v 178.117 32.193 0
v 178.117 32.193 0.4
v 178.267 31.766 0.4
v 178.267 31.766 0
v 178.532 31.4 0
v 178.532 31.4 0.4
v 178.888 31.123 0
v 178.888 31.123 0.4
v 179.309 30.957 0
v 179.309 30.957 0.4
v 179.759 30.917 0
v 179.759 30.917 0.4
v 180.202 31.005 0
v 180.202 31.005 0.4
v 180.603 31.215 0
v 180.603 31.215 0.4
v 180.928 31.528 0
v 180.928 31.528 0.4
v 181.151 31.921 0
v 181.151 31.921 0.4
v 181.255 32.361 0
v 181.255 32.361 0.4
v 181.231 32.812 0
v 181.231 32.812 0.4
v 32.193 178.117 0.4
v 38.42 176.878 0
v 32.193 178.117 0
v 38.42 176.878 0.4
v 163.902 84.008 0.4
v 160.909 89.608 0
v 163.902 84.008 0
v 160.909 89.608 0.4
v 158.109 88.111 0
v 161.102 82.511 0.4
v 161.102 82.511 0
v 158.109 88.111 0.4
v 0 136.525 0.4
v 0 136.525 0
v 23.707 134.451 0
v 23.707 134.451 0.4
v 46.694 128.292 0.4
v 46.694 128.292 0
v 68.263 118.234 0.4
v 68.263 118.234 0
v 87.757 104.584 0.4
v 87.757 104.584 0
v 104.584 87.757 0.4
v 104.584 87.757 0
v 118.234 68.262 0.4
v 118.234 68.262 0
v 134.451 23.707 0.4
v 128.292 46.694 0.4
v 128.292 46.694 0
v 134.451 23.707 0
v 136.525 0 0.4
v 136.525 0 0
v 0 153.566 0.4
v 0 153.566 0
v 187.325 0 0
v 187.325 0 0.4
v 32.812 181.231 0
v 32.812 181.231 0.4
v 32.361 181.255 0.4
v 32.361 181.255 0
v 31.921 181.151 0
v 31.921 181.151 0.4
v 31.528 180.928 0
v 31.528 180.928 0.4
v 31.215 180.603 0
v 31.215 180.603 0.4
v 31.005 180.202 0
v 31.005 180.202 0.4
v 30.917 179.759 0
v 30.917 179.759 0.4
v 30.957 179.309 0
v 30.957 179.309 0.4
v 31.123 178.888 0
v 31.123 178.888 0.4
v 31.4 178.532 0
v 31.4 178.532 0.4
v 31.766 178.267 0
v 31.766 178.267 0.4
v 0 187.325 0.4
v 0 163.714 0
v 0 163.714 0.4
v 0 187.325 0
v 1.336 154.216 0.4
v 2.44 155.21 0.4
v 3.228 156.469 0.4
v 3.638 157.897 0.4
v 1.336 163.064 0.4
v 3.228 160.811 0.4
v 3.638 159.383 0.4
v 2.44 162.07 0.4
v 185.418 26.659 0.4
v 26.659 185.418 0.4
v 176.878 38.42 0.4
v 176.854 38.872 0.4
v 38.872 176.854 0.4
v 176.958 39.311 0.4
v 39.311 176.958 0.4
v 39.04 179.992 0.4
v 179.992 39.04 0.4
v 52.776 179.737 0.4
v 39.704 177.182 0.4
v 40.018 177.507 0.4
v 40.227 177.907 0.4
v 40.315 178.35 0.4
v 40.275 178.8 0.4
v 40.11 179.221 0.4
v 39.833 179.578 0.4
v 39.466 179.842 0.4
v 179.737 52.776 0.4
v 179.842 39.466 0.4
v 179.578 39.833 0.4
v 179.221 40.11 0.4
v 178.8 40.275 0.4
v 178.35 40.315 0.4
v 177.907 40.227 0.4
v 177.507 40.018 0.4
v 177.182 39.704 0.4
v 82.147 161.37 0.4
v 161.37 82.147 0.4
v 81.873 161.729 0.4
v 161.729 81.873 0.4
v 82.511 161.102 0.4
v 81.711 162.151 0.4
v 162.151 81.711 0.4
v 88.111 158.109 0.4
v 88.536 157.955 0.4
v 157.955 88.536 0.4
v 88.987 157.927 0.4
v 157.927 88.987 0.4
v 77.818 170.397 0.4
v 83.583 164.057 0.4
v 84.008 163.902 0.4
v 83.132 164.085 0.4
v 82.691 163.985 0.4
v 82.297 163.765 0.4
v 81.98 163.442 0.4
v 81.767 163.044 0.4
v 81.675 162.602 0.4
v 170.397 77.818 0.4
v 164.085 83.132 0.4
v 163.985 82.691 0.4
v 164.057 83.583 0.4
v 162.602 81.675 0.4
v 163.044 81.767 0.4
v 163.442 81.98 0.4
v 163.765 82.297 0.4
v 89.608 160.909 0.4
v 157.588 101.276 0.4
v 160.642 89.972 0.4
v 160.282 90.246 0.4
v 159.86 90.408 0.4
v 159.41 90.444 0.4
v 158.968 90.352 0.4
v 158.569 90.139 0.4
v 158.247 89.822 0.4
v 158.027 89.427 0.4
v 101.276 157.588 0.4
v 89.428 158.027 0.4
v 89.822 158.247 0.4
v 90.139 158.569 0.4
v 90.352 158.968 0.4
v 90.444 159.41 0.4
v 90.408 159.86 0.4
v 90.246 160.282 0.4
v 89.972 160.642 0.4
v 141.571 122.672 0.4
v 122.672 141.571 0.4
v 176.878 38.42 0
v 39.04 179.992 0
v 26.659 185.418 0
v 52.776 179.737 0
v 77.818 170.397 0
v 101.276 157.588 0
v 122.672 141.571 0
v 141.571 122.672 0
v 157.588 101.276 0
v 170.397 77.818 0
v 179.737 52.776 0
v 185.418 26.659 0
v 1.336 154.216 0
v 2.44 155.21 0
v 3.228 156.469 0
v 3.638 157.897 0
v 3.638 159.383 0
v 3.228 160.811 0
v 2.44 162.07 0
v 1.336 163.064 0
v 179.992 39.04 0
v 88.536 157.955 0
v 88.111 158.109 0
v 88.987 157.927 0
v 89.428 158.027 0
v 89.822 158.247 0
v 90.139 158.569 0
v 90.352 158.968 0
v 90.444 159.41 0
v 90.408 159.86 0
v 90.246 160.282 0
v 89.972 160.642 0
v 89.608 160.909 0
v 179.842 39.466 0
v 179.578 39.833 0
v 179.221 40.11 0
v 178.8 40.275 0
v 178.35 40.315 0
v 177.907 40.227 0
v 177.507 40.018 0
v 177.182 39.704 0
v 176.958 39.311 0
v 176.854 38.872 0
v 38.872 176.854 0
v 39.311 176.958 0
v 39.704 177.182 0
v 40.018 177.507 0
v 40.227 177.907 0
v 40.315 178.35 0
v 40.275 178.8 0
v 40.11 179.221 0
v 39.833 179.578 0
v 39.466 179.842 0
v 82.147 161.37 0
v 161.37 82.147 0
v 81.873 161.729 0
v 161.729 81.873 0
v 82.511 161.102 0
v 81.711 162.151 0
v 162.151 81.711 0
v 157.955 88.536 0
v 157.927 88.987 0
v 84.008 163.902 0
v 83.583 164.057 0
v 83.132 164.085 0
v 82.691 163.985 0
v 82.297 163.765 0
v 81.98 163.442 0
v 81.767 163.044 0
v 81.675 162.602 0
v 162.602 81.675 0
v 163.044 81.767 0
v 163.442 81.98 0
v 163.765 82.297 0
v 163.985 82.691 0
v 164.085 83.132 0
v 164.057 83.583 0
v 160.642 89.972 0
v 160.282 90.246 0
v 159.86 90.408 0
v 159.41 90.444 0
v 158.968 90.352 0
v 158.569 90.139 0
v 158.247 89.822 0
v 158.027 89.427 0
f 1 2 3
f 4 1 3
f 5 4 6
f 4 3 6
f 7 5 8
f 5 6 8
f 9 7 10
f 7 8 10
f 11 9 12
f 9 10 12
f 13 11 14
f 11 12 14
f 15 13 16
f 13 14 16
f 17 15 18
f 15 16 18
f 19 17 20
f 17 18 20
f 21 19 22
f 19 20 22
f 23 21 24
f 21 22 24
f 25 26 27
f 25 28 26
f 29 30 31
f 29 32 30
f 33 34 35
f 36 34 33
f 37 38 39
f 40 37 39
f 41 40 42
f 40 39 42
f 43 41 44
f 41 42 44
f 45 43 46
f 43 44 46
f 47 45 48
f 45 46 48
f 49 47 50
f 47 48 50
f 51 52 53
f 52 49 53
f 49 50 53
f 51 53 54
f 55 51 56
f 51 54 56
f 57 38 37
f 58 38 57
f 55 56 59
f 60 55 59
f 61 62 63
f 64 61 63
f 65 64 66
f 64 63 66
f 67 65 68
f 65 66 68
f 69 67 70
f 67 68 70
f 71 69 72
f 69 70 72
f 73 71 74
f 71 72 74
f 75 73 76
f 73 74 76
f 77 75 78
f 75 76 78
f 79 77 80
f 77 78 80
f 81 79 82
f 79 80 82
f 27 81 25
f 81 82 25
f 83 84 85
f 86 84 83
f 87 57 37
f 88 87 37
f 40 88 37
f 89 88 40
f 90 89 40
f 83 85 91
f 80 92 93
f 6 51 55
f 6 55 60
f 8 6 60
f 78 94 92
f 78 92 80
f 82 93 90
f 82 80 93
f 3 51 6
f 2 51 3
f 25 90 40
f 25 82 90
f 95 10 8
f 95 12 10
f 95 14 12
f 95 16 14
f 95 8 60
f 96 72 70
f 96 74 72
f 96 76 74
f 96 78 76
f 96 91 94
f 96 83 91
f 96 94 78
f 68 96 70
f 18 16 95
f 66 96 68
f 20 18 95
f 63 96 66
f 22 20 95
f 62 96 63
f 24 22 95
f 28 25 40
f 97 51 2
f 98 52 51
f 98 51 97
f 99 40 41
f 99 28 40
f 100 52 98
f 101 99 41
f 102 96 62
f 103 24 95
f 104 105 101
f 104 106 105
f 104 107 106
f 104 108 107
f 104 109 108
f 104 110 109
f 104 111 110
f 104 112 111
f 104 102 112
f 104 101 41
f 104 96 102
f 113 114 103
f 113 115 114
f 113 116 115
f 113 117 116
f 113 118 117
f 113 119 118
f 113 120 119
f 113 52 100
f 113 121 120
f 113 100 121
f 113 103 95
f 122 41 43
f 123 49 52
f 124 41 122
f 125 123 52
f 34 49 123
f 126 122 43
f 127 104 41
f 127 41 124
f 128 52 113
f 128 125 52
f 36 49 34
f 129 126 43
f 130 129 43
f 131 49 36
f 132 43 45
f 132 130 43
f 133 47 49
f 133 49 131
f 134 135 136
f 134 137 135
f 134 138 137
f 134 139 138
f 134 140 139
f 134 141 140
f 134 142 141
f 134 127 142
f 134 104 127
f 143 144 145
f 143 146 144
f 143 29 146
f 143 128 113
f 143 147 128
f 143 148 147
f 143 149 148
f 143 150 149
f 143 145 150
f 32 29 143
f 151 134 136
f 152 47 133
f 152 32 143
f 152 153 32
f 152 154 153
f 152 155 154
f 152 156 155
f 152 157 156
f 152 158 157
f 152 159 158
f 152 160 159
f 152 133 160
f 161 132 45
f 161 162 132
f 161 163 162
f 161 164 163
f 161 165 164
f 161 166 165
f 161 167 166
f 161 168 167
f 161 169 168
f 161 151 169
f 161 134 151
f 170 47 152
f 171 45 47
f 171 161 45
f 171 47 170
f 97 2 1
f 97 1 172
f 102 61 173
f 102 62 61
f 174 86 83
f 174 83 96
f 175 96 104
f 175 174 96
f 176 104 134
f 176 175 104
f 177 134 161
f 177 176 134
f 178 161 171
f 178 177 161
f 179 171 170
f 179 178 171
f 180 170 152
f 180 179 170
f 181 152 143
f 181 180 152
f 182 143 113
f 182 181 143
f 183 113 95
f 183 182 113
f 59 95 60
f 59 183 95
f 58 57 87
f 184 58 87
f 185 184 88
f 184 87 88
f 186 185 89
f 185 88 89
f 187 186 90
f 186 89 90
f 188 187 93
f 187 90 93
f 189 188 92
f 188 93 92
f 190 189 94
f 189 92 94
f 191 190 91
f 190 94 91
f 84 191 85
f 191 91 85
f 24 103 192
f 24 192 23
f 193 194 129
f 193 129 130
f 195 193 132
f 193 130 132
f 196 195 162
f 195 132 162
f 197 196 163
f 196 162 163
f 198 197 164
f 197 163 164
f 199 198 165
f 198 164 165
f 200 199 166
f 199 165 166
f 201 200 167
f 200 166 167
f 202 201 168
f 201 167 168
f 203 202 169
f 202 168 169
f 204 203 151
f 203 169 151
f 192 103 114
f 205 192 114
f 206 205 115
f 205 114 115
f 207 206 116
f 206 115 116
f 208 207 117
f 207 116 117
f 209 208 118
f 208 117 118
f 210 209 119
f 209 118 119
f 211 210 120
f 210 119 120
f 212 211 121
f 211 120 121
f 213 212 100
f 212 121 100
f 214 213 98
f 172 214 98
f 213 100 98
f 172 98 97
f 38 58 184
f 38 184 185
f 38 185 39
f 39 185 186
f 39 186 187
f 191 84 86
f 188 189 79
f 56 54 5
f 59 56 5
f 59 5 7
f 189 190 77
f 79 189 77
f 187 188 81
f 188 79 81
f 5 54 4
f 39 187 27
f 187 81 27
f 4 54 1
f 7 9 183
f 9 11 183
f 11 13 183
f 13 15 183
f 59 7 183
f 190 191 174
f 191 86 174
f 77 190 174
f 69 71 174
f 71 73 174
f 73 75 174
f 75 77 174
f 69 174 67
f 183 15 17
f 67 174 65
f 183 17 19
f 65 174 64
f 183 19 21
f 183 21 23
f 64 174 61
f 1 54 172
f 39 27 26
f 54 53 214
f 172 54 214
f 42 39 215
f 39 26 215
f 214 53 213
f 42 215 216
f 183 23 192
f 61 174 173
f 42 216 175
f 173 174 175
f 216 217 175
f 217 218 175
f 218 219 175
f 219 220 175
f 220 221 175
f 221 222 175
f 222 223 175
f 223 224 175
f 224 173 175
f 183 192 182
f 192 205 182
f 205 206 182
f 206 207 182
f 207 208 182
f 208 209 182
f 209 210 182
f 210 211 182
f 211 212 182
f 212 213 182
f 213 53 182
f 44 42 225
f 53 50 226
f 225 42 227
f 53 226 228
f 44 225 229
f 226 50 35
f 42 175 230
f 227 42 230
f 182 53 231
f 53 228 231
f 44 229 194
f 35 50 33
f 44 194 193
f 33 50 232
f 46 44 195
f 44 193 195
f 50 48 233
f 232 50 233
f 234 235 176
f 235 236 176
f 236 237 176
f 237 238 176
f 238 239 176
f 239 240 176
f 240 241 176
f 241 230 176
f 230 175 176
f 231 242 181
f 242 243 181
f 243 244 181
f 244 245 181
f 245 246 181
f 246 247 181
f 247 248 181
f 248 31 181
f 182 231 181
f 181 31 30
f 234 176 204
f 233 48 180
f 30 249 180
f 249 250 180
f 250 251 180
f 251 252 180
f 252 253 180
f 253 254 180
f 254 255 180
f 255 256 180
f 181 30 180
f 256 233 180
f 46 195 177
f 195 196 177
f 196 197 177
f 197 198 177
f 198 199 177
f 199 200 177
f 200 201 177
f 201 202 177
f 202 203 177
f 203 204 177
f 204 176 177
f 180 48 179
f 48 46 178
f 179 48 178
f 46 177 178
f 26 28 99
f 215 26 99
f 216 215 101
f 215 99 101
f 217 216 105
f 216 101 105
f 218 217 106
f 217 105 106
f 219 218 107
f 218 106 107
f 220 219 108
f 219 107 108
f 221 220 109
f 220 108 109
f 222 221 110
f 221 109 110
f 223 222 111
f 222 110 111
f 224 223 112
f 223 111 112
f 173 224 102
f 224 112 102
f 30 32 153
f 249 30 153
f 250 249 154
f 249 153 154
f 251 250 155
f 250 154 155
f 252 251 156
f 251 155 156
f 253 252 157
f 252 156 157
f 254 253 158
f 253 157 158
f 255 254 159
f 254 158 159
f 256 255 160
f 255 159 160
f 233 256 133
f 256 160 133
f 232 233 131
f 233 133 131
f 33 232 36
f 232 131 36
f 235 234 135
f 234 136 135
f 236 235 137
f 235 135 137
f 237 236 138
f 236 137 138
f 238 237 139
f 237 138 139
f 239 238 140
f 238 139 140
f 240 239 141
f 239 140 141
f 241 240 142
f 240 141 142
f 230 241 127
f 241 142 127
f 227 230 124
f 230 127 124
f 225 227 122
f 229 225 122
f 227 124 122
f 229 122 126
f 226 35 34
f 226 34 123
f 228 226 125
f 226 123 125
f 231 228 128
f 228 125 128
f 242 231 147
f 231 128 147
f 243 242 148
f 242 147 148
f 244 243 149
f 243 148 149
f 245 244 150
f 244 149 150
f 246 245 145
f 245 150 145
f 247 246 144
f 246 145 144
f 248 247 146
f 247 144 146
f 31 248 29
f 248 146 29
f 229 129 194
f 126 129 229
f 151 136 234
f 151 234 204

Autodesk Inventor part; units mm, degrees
ref_plane "YZ Plane" through (0, 0, 0) normal (1, 0, 0) x (0, 1, 0)
ref_plane "XZ Plane" through (0, 0, 0) normal (0, 1, 0) x (-1, 0, 0)
ref_plane "XY Plane" through (0, 0, 0) normal (0, 0, 1) x (1, 0, 0)
sketch "Sketch1" plane through (0, 0, 0) normal (0, 0, 1) x (1, 0, 0)
  arc A0 (187.325, 0) -> (0, 187.325) centre (0, 0) ccw
  arc A1 (136.525, 0) -> (0, 136.525) centre (0, 0) ccw
  line L0 (0, 136.525) -> (0, 187.325)
  line L1 (136.525, 0) -> (187.325, 0)
  point P0 (161.925, 0)
  point P1 (0, 161.925)
  dimension "d2" = 187.325
  dimension "d3" = 136.525
extrude "Extrusion1" add sketch "Sketch1" along normal blind 0.4
sketch "Sketch3" plane through (0, 0, 0.4) normal (0, 0, 1) x (1, 0, 0)
  arc A0 (178.117, 32.1925) -> (181.231, 32.8119) centre (179.674, 32.5022) ccw projected
  line L0 (178.117, 32.1925) -> (176.8782, 38.4205) projected
  arc A1 (179.9922, 39.0399) -> (176.8782, 38.4205) centre (178.4352, 38.7302) ccw projected
  line L1 (179.9922, 39.0399) -> (181.231, 32.8119) projected
  line L2 (160.9091, 89.6078) -> (163.9025, 84.0076) projected
  arc A2 (161.1024, 82.5109) -> (163.9025, 84.0076) centre (162.5024, 83.2593) ccw projected
  line L3 (161.1024, 82.5109) -> (158.109, 88.1111) projected
  arc A3 (160.9091, 89.6078) -> (158.109, 88.1111) centre (159.5091, 88.8595) ccw projected
  line L4 (84.0076, 163.9025) -> (89.6078, 160.9091) projected
  arc A4 (84.0076, 163.9025) -> (82.5109, 161.1024) centre (83.2593, 162.5024) ccw projected
  line L5 (88.1111, 158.109) -> (82.5109, 161.1024) projected
  arc A5 (88.1111, 158.109) -> (89.6078, 160.9091) centre (88.8595, 159.5091) ccw projected
  arc A6 (38.4205, 176.8782) -> (39.0399, 179.9922) centre (38.7302, 178.4352) ccw projected
  line L6 (32.8119, 181.231) -> (39.0399, 179.9922) projected
  arc A7 (32.8119, 181.231) -> (32.1925, 178.117) centre (32.5022, 179.674) ccw projected
  line L7 (38.4205, 176.8782) -> (32.1925, 178.117) projected
  circle A8 centre (-1.6445, 158.6401) radius 5.334 projected
  point P0 (0, 0)
extrude "Extrusion2" cut sketch "Sketch3" against normal through all
properties part number "3DPRINT,CABLE,TRAY" material "ABS Plastic"
